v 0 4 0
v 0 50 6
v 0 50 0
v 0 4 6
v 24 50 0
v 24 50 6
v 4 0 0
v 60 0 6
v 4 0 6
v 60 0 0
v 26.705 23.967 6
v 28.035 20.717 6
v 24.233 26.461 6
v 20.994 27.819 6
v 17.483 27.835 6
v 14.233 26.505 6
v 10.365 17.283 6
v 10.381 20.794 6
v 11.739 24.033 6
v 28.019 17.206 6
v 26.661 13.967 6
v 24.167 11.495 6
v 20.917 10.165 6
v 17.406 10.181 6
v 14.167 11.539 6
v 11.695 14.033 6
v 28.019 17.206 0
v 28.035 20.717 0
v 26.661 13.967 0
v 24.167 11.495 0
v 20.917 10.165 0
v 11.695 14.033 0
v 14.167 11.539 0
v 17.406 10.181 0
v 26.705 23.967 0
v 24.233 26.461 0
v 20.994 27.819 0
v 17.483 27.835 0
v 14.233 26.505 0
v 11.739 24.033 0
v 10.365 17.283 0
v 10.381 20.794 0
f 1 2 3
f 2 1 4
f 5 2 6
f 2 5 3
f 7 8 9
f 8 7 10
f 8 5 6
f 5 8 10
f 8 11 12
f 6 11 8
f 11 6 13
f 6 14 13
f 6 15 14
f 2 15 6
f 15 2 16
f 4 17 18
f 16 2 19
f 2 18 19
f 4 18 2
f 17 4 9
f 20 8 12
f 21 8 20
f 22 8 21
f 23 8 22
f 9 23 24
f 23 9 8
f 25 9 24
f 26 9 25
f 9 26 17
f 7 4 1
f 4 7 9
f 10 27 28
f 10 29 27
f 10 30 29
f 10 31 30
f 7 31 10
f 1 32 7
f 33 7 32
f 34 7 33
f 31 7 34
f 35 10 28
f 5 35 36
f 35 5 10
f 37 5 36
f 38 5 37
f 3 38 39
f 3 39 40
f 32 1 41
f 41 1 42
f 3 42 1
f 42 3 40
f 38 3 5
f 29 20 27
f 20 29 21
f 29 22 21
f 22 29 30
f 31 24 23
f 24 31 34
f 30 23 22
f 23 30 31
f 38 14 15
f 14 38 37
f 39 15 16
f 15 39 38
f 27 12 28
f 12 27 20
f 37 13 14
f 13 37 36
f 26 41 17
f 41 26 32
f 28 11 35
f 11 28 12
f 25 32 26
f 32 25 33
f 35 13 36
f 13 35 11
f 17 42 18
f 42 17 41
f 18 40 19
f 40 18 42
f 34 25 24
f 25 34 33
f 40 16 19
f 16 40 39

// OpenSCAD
$fn = 32;

// ----------------------------------------------------------------------
// Bracket plate: gusset 60 x 50
// ----------------------------------------------------------------------

// --- parameters (mm) ---
hole_r = 3.5;             // bolt hole radius
plate_t = 6;              // plate thickness, Z (extrusion height)
gus_a = 60;               // base length
gus_b = 50;               // height
top_x = 24;               // top edge X of the angled cut
light_r = 9;              // lightening hole radius

light_d = 2 * light_r;

profile = [[4, 0], [30, 0], [60, 0], [24, 50], [0, 50], [0, 4]];  // primary outline, 6 points, counter clockwise
void_1 = [[28.035, 20.717], [26.705, 23.967], [24.233, 26.461], [20.994, 27.819], [17.483, 27.835], [14.233, 26.505], [11.739, 24.033], [10.381, 20.794], [10.365, 17.283], [11.695, 14.033], [14.167, 11.539], [17.406, 10.181], [20.917, 10.165], [24.167, 11.495], [26.661, 13.967], [28.019, 17.206]];  // lightening hole, 16 points

// --- the one profile operation ---
difference() {
  linear_extrude(height = plate_t) polygon(points = profile);
  translate([0, 0, -1])
    linear_extrude(height = plate_t + 2) polygon(points = void_1);
}
